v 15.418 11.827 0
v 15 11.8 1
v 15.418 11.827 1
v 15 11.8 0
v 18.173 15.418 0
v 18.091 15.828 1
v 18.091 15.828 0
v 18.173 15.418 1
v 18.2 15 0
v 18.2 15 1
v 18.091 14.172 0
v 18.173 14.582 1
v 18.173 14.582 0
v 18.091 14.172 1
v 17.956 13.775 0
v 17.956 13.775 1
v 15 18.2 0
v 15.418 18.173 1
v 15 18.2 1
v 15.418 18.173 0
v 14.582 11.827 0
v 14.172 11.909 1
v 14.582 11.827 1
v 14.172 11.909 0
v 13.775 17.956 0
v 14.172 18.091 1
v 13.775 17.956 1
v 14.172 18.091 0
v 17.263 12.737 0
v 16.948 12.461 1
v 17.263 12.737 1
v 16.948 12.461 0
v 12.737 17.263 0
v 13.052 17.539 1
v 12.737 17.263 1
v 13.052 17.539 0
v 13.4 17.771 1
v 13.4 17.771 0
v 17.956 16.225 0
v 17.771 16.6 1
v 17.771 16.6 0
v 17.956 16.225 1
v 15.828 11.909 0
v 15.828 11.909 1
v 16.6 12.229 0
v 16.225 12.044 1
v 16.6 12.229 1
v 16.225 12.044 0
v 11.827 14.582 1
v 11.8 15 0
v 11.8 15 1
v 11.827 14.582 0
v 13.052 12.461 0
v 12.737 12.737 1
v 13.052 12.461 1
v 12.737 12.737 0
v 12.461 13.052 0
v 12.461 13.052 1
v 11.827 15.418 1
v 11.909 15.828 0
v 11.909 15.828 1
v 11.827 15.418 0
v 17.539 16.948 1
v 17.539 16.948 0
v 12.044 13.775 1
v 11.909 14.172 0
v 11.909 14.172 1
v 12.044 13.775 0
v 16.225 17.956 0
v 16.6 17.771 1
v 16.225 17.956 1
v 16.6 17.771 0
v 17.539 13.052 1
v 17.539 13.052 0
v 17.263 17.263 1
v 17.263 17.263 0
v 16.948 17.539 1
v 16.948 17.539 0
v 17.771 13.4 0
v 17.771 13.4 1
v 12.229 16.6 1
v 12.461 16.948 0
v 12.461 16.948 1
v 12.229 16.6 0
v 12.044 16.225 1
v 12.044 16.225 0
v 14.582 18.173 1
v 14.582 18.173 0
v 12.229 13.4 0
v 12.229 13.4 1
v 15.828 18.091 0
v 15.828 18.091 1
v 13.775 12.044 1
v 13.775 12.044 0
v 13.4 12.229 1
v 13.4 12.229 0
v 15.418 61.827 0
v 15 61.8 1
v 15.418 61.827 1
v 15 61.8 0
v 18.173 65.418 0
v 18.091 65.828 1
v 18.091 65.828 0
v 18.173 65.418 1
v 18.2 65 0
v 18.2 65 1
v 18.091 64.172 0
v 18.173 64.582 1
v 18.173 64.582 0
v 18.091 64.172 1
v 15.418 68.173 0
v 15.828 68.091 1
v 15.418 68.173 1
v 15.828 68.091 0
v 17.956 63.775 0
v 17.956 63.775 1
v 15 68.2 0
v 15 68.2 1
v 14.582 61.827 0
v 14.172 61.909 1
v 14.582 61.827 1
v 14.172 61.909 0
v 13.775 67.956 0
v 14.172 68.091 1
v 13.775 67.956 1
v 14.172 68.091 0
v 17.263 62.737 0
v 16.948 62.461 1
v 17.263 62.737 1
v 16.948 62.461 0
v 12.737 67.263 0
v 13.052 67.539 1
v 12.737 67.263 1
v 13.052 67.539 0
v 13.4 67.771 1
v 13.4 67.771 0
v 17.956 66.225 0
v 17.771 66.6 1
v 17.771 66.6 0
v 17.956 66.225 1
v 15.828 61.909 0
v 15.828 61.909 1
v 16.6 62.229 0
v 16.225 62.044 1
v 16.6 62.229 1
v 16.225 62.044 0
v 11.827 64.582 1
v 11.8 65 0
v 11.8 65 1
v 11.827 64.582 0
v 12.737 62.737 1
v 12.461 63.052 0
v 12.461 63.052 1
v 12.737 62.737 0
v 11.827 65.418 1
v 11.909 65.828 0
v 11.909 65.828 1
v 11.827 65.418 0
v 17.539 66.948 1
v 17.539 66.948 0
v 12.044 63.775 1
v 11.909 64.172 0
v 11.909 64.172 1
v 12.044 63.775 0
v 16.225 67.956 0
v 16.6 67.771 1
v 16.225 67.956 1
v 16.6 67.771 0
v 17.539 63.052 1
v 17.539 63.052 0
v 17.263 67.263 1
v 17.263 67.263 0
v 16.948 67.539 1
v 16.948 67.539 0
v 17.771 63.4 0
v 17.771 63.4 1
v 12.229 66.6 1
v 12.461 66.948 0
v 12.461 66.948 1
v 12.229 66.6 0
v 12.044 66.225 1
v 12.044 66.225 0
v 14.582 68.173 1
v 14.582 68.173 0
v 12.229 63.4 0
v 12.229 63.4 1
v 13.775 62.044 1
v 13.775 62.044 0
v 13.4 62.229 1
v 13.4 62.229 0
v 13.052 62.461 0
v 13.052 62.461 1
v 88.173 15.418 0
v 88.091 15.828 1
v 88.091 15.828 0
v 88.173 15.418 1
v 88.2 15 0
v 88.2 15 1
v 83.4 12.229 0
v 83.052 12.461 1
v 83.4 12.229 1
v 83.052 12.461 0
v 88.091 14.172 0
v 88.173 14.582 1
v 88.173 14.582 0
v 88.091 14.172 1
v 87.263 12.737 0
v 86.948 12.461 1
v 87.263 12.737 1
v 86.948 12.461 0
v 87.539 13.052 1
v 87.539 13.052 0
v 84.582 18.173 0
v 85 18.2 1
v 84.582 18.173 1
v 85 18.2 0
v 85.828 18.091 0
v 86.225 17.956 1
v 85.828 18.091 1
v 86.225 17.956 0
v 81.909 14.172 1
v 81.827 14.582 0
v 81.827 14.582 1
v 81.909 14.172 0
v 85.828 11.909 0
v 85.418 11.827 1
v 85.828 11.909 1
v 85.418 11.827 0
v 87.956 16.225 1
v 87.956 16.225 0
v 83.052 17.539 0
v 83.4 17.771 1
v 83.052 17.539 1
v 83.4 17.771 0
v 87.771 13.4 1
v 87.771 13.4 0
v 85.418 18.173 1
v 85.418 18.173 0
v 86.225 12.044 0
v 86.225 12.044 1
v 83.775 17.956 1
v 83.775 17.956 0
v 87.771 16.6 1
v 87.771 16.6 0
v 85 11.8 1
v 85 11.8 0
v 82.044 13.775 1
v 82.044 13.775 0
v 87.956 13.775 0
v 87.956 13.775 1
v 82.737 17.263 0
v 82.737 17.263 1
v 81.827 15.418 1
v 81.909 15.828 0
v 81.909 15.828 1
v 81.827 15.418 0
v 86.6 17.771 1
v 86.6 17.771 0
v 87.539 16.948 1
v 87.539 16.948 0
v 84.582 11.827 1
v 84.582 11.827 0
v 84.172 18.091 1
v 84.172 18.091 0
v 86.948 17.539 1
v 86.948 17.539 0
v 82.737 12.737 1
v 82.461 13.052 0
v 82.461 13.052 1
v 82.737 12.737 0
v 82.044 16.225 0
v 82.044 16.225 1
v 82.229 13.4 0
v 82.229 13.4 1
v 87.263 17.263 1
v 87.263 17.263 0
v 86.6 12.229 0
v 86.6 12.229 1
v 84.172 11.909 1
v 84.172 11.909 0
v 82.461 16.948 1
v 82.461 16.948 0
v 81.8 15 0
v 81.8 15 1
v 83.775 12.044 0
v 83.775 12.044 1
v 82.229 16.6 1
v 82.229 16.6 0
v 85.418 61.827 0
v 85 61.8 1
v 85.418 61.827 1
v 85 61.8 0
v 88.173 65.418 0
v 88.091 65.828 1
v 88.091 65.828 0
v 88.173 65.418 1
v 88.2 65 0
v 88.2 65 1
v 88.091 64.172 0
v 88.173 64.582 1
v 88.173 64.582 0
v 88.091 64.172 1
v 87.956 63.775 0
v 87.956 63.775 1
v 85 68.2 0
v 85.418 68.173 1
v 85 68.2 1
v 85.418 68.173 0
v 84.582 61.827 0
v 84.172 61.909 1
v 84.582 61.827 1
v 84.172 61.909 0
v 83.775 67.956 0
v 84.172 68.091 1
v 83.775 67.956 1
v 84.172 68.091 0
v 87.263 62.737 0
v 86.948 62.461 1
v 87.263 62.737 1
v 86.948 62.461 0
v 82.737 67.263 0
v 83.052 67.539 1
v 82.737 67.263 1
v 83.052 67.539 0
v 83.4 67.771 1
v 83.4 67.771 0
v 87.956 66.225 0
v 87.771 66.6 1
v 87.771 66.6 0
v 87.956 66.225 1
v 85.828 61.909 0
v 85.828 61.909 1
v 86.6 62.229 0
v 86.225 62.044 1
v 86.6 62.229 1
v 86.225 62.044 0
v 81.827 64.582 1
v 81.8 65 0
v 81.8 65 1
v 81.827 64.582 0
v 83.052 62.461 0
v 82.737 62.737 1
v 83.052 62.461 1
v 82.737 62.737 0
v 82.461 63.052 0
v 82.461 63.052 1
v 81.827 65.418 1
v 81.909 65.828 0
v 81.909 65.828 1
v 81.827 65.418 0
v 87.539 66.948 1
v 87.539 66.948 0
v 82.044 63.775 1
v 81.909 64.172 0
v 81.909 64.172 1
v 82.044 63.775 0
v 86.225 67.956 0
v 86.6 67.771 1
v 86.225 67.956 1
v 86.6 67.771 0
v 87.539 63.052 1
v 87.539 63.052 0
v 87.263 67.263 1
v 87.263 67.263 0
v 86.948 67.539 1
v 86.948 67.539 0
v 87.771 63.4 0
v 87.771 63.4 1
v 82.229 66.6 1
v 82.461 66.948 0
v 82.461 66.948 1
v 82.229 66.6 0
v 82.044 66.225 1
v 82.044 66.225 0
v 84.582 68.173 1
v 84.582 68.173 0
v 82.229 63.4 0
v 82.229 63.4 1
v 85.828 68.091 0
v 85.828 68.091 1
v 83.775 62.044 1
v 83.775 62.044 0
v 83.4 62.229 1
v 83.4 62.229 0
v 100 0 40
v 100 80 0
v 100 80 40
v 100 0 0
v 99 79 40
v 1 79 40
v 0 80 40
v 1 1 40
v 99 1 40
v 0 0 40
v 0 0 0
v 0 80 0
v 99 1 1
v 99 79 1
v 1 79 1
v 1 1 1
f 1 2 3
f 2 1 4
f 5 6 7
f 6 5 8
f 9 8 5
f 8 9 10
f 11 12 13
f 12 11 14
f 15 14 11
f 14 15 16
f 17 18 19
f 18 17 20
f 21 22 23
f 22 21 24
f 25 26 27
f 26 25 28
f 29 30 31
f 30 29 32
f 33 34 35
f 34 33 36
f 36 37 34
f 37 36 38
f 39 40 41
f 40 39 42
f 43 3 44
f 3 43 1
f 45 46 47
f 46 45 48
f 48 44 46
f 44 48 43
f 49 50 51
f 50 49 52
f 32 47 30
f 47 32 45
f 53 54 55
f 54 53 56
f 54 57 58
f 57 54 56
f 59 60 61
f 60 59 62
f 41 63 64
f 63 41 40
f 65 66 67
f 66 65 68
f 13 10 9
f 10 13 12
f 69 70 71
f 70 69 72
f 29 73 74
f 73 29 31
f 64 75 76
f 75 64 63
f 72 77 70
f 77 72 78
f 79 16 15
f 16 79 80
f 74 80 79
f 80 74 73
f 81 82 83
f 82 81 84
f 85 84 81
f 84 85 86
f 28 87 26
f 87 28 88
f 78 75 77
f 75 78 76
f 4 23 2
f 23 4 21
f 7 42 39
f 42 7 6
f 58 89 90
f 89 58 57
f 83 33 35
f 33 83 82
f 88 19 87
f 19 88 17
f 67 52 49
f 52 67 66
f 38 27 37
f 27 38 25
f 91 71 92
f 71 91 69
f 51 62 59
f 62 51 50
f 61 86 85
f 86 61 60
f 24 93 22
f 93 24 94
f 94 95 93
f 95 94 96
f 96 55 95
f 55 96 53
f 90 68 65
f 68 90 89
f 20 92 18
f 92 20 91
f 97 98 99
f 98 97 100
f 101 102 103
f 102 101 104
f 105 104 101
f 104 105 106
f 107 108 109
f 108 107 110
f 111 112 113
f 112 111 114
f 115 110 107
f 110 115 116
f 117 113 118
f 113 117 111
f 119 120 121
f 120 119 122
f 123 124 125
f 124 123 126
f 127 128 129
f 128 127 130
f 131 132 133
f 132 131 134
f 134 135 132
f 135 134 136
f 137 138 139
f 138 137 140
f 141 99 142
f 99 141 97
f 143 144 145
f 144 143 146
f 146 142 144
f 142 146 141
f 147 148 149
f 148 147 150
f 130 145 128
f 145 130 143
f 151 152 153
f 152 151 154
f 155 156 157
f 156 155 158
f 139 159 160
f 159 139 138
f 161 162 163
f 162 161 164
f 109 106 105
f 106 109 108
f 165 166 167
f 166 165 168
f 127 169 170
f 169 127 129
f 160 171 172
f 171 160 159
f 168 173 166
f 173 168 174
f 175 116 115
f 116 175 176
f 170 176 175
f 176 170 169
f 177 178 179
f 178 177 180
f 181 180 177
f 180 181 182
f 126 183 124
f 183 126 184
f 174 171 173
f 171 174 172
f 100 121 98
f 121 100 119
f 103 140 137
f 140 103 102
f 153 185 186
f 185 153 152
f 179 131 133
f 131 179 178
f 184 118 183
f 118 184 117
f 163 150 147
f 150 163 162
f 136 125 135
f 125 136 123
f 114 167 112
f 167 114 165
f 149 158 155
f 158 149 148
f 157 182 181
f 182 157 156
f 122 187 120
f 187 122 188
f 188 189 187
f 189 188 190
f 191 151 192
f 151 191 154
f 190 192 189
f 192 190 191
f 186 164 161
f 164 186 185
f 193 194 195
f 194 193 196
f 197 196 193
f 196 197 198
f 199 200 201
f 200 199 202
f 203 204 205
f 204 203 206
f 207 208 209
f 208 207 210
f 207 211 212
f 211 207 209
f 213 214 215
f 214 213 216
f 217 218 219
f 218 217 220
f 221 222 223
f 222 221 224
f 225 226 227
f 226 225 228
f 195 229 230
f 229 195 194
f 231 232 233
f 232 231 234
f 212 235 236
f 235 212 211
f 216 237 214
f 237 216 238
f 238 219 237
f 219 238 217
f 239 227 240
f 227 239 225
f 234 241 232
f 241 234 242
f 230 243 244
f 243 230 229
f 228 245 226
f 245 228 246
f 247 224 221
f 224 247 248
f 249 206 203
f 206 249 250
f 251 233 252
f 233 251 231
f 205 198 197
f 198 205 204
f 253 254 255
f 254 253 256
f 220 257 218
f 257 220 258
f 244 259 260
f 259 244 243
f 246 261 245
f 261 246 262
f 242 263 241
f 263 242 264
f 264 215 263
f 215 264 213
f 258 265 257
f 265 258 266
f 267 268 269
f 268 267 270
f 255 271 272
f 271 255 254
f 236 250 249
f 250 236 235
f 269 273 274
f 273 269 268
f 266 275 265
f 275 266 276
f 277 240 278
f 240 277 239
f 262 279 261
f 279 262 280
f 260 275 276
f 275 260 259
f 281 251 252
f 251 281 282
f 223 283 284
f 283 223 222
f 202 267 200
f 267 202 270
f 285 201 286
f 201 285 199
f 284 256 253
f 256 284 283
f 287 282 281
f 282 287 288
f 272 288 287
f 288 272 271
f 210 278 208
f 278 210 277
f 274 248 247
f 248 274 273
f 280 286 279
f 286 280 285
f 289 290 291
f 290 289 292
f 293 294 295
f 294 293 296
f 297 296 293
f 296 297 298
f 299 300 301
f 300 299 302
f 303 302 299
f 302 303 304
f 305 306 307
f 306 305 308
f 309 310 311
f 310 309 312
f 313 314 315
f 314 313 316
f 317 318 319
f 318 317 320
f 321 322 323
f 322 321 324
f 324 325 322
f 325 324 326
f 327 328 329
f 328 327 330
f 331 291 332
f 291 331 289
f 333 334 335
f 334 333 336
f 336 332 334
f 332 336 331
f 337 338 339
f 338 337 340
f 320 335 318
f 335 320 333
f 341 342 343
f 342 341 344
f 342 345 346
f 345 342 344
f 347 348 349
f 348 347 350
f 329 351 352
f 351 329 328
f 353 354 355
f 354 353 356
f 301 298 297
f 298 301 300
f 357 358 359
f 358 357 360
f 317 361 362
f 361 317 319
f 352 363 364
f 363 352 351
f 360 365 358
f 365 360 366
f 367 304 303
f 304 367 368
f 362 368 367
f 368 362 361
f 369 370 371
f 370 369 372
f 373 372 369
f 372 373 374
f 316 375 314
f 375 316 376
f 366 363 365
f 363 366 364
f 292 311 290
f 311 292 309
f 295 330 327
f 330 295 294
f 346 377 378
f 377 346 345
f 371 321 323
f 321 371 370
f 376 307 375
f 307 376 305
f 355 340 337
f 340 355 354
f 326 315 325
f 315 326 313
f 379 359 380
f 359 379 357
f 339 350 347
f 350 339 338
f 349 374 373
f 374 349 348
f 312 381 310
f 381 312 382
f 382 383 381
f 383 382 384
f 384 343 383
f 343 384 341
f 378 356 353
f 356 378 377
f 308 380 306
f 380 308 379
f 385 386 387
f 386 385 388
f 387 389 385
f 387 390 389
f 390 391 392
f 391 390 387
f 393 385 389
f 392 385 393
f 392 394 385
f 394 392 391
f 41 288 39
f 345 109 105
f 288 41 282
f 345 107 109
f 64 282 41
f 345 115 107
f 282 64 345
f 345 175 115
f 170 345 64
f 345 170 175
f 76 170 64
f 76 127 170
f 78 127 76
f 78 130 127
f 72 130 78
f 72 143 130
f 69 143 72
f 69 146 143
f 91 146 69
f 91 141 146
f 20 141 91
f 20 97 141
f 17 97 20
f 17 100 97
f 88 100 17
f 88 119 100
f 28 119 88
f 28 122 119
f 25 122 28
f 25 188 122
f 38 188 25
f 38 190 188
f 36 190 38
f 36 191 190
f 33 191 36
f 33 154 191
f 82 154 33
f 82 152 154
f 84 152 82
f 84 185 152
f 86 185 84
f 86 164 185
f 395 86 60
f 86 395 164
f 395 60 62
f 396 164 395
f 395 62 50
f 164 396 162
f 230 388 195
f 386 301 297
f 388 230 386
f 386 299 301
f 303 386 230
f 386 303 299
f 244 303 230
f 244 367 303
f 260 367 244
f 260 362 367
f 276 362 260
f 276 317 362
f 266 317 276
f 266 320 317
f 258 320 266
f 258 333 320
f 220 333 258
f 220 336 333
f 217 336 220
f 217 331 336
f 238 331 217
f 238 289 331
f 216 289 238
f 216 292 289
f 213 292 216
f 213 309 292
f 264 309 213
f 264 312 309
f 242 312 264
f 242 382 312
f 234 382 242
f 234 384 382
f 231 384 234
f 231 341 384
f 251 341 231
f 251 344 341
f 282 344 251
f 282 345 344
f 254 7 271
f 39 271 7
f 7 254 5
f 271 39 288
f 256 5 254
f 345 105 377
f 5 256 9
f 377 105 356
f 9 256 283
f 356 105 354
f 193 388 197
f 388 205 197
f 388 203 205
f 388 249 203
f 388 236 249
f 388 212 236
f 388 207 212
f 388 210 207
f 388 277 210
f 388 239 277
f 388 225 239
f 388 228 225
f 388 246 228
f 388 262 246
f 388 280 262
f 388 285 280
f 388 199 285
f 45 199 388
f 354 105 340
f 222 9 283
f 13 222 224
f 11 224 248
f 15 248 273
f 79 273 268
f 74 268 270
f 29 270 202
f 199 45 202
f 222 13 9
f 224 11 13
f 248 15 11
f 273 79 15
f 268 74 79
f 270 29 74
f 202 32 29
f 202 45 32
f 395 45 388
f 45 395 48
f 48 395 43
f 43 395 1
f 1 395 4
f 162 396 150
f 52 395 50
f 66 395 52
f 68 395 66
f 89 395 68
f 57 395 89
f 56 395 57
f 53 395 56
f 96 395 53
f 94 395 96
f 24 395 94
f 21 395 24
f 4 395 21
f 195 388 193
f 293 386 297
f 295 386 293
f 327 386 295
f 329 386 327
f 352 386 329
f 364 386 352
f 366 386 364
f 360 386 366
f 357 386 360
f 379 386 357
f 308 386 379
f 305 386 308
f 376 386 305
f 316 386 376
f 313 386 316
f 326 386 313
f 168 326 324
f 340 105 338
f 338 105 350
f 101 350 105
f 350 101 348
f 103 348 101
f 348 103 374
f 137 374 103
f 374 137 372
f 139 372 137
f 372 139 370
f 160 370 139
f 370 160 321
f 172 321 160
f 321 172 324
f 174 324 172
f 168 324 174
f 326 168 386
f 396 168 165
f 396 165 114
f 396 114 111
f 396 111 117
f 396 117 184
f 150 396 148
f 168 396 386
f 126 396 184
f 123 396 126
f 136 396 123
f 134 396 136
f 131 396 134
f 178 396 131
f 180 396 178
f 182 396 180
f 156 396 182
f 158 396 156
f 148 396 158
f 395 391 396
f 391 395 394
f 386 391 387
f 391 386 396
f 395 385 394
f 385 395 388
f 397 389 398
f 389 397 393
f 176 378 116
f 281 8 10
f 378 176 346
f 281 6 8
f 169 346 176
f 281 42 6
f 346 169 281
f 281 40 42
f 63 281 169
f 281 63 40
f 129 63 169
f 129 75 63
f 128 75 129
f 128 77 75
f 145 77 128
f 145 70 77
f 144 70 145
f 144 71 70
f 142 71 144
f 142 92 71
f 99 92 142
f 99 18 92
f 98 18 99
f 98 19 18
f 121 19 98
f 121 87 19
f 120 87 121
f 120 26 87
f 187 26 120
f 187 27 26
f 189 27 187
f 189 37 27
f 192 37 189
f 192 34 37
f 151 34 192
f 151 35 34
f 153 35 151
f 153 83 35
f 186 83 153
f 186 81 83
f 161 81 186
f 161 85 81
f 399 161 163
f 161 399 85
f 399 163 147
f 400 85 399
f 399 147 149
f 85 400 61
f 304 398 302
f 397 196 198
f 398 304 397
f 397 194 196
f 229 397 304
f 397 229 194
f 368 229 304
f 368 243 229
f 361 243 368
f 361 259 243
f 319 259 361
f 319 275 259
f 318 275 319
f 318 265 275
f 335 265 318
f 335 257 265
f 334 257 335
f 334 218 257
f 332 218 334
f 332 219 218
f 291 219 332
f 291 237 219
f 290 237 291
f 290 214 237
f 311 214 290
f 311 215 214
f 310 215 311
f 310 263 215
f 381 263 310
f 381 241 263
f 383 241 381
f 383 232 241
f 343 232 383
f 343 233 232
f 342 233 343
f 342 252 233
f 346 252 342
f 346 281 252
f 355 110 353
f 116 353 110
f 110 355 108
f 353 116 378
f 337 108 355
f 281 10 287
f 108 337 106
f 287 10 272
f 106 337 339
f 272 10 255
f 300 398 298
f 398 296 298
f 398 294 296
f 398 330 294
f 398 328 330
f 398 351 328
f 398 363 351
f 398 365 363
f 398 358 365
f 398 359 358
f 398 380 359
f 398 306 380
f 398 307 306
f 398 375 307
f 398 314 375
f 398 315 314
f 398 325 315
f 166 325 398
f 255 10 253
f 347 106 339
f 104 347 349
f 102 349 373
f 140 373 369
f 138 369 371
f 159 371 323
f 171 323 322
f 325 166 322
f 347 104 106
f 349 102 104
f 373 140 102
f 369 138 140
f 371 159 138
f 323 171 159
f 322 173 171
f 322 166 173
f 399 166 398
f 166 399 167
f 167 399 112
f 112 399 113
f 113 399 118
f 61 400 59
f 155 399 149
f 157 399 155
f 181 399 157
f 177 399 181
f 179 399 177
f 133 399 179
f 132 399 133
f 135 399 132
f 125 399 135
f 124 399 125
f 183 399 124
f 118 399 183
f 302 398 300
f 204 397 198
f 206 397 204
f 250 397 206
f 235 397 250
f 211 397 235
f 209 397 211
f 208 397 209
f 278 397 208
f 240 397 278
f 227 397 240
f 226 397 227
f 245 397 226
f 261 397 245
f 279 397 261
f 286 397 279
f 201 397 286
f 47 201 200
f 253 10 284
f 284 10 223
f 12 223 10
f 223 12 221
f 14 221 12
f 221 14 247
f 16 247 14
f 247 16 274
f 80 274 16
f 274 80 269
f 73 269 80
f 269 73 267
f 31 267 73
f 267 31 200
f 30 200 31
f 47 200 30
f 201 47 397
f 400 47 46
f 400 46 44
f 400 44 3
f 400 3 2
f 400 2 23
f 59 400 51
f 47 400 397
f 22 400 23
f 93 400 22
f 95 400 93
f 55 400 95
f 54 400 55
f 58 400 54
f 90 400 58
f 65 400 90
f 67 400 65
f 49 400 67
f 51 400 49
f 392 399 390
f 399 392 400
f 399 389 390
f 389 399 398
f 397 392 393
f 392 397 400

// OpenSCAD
$fn = 48;
wall = 1.0;

difference() {
    cube([100, 80, 40]);
    translate([wall, wall, wall])
        cube([100 - 2 * wall, 80 - 2 * wall, 40 - wall]);
    for (x = [15, 85], y = [15, 65])
        translate([x, y, -1])
            cylinder(h = 42, r = 3.2);
}
